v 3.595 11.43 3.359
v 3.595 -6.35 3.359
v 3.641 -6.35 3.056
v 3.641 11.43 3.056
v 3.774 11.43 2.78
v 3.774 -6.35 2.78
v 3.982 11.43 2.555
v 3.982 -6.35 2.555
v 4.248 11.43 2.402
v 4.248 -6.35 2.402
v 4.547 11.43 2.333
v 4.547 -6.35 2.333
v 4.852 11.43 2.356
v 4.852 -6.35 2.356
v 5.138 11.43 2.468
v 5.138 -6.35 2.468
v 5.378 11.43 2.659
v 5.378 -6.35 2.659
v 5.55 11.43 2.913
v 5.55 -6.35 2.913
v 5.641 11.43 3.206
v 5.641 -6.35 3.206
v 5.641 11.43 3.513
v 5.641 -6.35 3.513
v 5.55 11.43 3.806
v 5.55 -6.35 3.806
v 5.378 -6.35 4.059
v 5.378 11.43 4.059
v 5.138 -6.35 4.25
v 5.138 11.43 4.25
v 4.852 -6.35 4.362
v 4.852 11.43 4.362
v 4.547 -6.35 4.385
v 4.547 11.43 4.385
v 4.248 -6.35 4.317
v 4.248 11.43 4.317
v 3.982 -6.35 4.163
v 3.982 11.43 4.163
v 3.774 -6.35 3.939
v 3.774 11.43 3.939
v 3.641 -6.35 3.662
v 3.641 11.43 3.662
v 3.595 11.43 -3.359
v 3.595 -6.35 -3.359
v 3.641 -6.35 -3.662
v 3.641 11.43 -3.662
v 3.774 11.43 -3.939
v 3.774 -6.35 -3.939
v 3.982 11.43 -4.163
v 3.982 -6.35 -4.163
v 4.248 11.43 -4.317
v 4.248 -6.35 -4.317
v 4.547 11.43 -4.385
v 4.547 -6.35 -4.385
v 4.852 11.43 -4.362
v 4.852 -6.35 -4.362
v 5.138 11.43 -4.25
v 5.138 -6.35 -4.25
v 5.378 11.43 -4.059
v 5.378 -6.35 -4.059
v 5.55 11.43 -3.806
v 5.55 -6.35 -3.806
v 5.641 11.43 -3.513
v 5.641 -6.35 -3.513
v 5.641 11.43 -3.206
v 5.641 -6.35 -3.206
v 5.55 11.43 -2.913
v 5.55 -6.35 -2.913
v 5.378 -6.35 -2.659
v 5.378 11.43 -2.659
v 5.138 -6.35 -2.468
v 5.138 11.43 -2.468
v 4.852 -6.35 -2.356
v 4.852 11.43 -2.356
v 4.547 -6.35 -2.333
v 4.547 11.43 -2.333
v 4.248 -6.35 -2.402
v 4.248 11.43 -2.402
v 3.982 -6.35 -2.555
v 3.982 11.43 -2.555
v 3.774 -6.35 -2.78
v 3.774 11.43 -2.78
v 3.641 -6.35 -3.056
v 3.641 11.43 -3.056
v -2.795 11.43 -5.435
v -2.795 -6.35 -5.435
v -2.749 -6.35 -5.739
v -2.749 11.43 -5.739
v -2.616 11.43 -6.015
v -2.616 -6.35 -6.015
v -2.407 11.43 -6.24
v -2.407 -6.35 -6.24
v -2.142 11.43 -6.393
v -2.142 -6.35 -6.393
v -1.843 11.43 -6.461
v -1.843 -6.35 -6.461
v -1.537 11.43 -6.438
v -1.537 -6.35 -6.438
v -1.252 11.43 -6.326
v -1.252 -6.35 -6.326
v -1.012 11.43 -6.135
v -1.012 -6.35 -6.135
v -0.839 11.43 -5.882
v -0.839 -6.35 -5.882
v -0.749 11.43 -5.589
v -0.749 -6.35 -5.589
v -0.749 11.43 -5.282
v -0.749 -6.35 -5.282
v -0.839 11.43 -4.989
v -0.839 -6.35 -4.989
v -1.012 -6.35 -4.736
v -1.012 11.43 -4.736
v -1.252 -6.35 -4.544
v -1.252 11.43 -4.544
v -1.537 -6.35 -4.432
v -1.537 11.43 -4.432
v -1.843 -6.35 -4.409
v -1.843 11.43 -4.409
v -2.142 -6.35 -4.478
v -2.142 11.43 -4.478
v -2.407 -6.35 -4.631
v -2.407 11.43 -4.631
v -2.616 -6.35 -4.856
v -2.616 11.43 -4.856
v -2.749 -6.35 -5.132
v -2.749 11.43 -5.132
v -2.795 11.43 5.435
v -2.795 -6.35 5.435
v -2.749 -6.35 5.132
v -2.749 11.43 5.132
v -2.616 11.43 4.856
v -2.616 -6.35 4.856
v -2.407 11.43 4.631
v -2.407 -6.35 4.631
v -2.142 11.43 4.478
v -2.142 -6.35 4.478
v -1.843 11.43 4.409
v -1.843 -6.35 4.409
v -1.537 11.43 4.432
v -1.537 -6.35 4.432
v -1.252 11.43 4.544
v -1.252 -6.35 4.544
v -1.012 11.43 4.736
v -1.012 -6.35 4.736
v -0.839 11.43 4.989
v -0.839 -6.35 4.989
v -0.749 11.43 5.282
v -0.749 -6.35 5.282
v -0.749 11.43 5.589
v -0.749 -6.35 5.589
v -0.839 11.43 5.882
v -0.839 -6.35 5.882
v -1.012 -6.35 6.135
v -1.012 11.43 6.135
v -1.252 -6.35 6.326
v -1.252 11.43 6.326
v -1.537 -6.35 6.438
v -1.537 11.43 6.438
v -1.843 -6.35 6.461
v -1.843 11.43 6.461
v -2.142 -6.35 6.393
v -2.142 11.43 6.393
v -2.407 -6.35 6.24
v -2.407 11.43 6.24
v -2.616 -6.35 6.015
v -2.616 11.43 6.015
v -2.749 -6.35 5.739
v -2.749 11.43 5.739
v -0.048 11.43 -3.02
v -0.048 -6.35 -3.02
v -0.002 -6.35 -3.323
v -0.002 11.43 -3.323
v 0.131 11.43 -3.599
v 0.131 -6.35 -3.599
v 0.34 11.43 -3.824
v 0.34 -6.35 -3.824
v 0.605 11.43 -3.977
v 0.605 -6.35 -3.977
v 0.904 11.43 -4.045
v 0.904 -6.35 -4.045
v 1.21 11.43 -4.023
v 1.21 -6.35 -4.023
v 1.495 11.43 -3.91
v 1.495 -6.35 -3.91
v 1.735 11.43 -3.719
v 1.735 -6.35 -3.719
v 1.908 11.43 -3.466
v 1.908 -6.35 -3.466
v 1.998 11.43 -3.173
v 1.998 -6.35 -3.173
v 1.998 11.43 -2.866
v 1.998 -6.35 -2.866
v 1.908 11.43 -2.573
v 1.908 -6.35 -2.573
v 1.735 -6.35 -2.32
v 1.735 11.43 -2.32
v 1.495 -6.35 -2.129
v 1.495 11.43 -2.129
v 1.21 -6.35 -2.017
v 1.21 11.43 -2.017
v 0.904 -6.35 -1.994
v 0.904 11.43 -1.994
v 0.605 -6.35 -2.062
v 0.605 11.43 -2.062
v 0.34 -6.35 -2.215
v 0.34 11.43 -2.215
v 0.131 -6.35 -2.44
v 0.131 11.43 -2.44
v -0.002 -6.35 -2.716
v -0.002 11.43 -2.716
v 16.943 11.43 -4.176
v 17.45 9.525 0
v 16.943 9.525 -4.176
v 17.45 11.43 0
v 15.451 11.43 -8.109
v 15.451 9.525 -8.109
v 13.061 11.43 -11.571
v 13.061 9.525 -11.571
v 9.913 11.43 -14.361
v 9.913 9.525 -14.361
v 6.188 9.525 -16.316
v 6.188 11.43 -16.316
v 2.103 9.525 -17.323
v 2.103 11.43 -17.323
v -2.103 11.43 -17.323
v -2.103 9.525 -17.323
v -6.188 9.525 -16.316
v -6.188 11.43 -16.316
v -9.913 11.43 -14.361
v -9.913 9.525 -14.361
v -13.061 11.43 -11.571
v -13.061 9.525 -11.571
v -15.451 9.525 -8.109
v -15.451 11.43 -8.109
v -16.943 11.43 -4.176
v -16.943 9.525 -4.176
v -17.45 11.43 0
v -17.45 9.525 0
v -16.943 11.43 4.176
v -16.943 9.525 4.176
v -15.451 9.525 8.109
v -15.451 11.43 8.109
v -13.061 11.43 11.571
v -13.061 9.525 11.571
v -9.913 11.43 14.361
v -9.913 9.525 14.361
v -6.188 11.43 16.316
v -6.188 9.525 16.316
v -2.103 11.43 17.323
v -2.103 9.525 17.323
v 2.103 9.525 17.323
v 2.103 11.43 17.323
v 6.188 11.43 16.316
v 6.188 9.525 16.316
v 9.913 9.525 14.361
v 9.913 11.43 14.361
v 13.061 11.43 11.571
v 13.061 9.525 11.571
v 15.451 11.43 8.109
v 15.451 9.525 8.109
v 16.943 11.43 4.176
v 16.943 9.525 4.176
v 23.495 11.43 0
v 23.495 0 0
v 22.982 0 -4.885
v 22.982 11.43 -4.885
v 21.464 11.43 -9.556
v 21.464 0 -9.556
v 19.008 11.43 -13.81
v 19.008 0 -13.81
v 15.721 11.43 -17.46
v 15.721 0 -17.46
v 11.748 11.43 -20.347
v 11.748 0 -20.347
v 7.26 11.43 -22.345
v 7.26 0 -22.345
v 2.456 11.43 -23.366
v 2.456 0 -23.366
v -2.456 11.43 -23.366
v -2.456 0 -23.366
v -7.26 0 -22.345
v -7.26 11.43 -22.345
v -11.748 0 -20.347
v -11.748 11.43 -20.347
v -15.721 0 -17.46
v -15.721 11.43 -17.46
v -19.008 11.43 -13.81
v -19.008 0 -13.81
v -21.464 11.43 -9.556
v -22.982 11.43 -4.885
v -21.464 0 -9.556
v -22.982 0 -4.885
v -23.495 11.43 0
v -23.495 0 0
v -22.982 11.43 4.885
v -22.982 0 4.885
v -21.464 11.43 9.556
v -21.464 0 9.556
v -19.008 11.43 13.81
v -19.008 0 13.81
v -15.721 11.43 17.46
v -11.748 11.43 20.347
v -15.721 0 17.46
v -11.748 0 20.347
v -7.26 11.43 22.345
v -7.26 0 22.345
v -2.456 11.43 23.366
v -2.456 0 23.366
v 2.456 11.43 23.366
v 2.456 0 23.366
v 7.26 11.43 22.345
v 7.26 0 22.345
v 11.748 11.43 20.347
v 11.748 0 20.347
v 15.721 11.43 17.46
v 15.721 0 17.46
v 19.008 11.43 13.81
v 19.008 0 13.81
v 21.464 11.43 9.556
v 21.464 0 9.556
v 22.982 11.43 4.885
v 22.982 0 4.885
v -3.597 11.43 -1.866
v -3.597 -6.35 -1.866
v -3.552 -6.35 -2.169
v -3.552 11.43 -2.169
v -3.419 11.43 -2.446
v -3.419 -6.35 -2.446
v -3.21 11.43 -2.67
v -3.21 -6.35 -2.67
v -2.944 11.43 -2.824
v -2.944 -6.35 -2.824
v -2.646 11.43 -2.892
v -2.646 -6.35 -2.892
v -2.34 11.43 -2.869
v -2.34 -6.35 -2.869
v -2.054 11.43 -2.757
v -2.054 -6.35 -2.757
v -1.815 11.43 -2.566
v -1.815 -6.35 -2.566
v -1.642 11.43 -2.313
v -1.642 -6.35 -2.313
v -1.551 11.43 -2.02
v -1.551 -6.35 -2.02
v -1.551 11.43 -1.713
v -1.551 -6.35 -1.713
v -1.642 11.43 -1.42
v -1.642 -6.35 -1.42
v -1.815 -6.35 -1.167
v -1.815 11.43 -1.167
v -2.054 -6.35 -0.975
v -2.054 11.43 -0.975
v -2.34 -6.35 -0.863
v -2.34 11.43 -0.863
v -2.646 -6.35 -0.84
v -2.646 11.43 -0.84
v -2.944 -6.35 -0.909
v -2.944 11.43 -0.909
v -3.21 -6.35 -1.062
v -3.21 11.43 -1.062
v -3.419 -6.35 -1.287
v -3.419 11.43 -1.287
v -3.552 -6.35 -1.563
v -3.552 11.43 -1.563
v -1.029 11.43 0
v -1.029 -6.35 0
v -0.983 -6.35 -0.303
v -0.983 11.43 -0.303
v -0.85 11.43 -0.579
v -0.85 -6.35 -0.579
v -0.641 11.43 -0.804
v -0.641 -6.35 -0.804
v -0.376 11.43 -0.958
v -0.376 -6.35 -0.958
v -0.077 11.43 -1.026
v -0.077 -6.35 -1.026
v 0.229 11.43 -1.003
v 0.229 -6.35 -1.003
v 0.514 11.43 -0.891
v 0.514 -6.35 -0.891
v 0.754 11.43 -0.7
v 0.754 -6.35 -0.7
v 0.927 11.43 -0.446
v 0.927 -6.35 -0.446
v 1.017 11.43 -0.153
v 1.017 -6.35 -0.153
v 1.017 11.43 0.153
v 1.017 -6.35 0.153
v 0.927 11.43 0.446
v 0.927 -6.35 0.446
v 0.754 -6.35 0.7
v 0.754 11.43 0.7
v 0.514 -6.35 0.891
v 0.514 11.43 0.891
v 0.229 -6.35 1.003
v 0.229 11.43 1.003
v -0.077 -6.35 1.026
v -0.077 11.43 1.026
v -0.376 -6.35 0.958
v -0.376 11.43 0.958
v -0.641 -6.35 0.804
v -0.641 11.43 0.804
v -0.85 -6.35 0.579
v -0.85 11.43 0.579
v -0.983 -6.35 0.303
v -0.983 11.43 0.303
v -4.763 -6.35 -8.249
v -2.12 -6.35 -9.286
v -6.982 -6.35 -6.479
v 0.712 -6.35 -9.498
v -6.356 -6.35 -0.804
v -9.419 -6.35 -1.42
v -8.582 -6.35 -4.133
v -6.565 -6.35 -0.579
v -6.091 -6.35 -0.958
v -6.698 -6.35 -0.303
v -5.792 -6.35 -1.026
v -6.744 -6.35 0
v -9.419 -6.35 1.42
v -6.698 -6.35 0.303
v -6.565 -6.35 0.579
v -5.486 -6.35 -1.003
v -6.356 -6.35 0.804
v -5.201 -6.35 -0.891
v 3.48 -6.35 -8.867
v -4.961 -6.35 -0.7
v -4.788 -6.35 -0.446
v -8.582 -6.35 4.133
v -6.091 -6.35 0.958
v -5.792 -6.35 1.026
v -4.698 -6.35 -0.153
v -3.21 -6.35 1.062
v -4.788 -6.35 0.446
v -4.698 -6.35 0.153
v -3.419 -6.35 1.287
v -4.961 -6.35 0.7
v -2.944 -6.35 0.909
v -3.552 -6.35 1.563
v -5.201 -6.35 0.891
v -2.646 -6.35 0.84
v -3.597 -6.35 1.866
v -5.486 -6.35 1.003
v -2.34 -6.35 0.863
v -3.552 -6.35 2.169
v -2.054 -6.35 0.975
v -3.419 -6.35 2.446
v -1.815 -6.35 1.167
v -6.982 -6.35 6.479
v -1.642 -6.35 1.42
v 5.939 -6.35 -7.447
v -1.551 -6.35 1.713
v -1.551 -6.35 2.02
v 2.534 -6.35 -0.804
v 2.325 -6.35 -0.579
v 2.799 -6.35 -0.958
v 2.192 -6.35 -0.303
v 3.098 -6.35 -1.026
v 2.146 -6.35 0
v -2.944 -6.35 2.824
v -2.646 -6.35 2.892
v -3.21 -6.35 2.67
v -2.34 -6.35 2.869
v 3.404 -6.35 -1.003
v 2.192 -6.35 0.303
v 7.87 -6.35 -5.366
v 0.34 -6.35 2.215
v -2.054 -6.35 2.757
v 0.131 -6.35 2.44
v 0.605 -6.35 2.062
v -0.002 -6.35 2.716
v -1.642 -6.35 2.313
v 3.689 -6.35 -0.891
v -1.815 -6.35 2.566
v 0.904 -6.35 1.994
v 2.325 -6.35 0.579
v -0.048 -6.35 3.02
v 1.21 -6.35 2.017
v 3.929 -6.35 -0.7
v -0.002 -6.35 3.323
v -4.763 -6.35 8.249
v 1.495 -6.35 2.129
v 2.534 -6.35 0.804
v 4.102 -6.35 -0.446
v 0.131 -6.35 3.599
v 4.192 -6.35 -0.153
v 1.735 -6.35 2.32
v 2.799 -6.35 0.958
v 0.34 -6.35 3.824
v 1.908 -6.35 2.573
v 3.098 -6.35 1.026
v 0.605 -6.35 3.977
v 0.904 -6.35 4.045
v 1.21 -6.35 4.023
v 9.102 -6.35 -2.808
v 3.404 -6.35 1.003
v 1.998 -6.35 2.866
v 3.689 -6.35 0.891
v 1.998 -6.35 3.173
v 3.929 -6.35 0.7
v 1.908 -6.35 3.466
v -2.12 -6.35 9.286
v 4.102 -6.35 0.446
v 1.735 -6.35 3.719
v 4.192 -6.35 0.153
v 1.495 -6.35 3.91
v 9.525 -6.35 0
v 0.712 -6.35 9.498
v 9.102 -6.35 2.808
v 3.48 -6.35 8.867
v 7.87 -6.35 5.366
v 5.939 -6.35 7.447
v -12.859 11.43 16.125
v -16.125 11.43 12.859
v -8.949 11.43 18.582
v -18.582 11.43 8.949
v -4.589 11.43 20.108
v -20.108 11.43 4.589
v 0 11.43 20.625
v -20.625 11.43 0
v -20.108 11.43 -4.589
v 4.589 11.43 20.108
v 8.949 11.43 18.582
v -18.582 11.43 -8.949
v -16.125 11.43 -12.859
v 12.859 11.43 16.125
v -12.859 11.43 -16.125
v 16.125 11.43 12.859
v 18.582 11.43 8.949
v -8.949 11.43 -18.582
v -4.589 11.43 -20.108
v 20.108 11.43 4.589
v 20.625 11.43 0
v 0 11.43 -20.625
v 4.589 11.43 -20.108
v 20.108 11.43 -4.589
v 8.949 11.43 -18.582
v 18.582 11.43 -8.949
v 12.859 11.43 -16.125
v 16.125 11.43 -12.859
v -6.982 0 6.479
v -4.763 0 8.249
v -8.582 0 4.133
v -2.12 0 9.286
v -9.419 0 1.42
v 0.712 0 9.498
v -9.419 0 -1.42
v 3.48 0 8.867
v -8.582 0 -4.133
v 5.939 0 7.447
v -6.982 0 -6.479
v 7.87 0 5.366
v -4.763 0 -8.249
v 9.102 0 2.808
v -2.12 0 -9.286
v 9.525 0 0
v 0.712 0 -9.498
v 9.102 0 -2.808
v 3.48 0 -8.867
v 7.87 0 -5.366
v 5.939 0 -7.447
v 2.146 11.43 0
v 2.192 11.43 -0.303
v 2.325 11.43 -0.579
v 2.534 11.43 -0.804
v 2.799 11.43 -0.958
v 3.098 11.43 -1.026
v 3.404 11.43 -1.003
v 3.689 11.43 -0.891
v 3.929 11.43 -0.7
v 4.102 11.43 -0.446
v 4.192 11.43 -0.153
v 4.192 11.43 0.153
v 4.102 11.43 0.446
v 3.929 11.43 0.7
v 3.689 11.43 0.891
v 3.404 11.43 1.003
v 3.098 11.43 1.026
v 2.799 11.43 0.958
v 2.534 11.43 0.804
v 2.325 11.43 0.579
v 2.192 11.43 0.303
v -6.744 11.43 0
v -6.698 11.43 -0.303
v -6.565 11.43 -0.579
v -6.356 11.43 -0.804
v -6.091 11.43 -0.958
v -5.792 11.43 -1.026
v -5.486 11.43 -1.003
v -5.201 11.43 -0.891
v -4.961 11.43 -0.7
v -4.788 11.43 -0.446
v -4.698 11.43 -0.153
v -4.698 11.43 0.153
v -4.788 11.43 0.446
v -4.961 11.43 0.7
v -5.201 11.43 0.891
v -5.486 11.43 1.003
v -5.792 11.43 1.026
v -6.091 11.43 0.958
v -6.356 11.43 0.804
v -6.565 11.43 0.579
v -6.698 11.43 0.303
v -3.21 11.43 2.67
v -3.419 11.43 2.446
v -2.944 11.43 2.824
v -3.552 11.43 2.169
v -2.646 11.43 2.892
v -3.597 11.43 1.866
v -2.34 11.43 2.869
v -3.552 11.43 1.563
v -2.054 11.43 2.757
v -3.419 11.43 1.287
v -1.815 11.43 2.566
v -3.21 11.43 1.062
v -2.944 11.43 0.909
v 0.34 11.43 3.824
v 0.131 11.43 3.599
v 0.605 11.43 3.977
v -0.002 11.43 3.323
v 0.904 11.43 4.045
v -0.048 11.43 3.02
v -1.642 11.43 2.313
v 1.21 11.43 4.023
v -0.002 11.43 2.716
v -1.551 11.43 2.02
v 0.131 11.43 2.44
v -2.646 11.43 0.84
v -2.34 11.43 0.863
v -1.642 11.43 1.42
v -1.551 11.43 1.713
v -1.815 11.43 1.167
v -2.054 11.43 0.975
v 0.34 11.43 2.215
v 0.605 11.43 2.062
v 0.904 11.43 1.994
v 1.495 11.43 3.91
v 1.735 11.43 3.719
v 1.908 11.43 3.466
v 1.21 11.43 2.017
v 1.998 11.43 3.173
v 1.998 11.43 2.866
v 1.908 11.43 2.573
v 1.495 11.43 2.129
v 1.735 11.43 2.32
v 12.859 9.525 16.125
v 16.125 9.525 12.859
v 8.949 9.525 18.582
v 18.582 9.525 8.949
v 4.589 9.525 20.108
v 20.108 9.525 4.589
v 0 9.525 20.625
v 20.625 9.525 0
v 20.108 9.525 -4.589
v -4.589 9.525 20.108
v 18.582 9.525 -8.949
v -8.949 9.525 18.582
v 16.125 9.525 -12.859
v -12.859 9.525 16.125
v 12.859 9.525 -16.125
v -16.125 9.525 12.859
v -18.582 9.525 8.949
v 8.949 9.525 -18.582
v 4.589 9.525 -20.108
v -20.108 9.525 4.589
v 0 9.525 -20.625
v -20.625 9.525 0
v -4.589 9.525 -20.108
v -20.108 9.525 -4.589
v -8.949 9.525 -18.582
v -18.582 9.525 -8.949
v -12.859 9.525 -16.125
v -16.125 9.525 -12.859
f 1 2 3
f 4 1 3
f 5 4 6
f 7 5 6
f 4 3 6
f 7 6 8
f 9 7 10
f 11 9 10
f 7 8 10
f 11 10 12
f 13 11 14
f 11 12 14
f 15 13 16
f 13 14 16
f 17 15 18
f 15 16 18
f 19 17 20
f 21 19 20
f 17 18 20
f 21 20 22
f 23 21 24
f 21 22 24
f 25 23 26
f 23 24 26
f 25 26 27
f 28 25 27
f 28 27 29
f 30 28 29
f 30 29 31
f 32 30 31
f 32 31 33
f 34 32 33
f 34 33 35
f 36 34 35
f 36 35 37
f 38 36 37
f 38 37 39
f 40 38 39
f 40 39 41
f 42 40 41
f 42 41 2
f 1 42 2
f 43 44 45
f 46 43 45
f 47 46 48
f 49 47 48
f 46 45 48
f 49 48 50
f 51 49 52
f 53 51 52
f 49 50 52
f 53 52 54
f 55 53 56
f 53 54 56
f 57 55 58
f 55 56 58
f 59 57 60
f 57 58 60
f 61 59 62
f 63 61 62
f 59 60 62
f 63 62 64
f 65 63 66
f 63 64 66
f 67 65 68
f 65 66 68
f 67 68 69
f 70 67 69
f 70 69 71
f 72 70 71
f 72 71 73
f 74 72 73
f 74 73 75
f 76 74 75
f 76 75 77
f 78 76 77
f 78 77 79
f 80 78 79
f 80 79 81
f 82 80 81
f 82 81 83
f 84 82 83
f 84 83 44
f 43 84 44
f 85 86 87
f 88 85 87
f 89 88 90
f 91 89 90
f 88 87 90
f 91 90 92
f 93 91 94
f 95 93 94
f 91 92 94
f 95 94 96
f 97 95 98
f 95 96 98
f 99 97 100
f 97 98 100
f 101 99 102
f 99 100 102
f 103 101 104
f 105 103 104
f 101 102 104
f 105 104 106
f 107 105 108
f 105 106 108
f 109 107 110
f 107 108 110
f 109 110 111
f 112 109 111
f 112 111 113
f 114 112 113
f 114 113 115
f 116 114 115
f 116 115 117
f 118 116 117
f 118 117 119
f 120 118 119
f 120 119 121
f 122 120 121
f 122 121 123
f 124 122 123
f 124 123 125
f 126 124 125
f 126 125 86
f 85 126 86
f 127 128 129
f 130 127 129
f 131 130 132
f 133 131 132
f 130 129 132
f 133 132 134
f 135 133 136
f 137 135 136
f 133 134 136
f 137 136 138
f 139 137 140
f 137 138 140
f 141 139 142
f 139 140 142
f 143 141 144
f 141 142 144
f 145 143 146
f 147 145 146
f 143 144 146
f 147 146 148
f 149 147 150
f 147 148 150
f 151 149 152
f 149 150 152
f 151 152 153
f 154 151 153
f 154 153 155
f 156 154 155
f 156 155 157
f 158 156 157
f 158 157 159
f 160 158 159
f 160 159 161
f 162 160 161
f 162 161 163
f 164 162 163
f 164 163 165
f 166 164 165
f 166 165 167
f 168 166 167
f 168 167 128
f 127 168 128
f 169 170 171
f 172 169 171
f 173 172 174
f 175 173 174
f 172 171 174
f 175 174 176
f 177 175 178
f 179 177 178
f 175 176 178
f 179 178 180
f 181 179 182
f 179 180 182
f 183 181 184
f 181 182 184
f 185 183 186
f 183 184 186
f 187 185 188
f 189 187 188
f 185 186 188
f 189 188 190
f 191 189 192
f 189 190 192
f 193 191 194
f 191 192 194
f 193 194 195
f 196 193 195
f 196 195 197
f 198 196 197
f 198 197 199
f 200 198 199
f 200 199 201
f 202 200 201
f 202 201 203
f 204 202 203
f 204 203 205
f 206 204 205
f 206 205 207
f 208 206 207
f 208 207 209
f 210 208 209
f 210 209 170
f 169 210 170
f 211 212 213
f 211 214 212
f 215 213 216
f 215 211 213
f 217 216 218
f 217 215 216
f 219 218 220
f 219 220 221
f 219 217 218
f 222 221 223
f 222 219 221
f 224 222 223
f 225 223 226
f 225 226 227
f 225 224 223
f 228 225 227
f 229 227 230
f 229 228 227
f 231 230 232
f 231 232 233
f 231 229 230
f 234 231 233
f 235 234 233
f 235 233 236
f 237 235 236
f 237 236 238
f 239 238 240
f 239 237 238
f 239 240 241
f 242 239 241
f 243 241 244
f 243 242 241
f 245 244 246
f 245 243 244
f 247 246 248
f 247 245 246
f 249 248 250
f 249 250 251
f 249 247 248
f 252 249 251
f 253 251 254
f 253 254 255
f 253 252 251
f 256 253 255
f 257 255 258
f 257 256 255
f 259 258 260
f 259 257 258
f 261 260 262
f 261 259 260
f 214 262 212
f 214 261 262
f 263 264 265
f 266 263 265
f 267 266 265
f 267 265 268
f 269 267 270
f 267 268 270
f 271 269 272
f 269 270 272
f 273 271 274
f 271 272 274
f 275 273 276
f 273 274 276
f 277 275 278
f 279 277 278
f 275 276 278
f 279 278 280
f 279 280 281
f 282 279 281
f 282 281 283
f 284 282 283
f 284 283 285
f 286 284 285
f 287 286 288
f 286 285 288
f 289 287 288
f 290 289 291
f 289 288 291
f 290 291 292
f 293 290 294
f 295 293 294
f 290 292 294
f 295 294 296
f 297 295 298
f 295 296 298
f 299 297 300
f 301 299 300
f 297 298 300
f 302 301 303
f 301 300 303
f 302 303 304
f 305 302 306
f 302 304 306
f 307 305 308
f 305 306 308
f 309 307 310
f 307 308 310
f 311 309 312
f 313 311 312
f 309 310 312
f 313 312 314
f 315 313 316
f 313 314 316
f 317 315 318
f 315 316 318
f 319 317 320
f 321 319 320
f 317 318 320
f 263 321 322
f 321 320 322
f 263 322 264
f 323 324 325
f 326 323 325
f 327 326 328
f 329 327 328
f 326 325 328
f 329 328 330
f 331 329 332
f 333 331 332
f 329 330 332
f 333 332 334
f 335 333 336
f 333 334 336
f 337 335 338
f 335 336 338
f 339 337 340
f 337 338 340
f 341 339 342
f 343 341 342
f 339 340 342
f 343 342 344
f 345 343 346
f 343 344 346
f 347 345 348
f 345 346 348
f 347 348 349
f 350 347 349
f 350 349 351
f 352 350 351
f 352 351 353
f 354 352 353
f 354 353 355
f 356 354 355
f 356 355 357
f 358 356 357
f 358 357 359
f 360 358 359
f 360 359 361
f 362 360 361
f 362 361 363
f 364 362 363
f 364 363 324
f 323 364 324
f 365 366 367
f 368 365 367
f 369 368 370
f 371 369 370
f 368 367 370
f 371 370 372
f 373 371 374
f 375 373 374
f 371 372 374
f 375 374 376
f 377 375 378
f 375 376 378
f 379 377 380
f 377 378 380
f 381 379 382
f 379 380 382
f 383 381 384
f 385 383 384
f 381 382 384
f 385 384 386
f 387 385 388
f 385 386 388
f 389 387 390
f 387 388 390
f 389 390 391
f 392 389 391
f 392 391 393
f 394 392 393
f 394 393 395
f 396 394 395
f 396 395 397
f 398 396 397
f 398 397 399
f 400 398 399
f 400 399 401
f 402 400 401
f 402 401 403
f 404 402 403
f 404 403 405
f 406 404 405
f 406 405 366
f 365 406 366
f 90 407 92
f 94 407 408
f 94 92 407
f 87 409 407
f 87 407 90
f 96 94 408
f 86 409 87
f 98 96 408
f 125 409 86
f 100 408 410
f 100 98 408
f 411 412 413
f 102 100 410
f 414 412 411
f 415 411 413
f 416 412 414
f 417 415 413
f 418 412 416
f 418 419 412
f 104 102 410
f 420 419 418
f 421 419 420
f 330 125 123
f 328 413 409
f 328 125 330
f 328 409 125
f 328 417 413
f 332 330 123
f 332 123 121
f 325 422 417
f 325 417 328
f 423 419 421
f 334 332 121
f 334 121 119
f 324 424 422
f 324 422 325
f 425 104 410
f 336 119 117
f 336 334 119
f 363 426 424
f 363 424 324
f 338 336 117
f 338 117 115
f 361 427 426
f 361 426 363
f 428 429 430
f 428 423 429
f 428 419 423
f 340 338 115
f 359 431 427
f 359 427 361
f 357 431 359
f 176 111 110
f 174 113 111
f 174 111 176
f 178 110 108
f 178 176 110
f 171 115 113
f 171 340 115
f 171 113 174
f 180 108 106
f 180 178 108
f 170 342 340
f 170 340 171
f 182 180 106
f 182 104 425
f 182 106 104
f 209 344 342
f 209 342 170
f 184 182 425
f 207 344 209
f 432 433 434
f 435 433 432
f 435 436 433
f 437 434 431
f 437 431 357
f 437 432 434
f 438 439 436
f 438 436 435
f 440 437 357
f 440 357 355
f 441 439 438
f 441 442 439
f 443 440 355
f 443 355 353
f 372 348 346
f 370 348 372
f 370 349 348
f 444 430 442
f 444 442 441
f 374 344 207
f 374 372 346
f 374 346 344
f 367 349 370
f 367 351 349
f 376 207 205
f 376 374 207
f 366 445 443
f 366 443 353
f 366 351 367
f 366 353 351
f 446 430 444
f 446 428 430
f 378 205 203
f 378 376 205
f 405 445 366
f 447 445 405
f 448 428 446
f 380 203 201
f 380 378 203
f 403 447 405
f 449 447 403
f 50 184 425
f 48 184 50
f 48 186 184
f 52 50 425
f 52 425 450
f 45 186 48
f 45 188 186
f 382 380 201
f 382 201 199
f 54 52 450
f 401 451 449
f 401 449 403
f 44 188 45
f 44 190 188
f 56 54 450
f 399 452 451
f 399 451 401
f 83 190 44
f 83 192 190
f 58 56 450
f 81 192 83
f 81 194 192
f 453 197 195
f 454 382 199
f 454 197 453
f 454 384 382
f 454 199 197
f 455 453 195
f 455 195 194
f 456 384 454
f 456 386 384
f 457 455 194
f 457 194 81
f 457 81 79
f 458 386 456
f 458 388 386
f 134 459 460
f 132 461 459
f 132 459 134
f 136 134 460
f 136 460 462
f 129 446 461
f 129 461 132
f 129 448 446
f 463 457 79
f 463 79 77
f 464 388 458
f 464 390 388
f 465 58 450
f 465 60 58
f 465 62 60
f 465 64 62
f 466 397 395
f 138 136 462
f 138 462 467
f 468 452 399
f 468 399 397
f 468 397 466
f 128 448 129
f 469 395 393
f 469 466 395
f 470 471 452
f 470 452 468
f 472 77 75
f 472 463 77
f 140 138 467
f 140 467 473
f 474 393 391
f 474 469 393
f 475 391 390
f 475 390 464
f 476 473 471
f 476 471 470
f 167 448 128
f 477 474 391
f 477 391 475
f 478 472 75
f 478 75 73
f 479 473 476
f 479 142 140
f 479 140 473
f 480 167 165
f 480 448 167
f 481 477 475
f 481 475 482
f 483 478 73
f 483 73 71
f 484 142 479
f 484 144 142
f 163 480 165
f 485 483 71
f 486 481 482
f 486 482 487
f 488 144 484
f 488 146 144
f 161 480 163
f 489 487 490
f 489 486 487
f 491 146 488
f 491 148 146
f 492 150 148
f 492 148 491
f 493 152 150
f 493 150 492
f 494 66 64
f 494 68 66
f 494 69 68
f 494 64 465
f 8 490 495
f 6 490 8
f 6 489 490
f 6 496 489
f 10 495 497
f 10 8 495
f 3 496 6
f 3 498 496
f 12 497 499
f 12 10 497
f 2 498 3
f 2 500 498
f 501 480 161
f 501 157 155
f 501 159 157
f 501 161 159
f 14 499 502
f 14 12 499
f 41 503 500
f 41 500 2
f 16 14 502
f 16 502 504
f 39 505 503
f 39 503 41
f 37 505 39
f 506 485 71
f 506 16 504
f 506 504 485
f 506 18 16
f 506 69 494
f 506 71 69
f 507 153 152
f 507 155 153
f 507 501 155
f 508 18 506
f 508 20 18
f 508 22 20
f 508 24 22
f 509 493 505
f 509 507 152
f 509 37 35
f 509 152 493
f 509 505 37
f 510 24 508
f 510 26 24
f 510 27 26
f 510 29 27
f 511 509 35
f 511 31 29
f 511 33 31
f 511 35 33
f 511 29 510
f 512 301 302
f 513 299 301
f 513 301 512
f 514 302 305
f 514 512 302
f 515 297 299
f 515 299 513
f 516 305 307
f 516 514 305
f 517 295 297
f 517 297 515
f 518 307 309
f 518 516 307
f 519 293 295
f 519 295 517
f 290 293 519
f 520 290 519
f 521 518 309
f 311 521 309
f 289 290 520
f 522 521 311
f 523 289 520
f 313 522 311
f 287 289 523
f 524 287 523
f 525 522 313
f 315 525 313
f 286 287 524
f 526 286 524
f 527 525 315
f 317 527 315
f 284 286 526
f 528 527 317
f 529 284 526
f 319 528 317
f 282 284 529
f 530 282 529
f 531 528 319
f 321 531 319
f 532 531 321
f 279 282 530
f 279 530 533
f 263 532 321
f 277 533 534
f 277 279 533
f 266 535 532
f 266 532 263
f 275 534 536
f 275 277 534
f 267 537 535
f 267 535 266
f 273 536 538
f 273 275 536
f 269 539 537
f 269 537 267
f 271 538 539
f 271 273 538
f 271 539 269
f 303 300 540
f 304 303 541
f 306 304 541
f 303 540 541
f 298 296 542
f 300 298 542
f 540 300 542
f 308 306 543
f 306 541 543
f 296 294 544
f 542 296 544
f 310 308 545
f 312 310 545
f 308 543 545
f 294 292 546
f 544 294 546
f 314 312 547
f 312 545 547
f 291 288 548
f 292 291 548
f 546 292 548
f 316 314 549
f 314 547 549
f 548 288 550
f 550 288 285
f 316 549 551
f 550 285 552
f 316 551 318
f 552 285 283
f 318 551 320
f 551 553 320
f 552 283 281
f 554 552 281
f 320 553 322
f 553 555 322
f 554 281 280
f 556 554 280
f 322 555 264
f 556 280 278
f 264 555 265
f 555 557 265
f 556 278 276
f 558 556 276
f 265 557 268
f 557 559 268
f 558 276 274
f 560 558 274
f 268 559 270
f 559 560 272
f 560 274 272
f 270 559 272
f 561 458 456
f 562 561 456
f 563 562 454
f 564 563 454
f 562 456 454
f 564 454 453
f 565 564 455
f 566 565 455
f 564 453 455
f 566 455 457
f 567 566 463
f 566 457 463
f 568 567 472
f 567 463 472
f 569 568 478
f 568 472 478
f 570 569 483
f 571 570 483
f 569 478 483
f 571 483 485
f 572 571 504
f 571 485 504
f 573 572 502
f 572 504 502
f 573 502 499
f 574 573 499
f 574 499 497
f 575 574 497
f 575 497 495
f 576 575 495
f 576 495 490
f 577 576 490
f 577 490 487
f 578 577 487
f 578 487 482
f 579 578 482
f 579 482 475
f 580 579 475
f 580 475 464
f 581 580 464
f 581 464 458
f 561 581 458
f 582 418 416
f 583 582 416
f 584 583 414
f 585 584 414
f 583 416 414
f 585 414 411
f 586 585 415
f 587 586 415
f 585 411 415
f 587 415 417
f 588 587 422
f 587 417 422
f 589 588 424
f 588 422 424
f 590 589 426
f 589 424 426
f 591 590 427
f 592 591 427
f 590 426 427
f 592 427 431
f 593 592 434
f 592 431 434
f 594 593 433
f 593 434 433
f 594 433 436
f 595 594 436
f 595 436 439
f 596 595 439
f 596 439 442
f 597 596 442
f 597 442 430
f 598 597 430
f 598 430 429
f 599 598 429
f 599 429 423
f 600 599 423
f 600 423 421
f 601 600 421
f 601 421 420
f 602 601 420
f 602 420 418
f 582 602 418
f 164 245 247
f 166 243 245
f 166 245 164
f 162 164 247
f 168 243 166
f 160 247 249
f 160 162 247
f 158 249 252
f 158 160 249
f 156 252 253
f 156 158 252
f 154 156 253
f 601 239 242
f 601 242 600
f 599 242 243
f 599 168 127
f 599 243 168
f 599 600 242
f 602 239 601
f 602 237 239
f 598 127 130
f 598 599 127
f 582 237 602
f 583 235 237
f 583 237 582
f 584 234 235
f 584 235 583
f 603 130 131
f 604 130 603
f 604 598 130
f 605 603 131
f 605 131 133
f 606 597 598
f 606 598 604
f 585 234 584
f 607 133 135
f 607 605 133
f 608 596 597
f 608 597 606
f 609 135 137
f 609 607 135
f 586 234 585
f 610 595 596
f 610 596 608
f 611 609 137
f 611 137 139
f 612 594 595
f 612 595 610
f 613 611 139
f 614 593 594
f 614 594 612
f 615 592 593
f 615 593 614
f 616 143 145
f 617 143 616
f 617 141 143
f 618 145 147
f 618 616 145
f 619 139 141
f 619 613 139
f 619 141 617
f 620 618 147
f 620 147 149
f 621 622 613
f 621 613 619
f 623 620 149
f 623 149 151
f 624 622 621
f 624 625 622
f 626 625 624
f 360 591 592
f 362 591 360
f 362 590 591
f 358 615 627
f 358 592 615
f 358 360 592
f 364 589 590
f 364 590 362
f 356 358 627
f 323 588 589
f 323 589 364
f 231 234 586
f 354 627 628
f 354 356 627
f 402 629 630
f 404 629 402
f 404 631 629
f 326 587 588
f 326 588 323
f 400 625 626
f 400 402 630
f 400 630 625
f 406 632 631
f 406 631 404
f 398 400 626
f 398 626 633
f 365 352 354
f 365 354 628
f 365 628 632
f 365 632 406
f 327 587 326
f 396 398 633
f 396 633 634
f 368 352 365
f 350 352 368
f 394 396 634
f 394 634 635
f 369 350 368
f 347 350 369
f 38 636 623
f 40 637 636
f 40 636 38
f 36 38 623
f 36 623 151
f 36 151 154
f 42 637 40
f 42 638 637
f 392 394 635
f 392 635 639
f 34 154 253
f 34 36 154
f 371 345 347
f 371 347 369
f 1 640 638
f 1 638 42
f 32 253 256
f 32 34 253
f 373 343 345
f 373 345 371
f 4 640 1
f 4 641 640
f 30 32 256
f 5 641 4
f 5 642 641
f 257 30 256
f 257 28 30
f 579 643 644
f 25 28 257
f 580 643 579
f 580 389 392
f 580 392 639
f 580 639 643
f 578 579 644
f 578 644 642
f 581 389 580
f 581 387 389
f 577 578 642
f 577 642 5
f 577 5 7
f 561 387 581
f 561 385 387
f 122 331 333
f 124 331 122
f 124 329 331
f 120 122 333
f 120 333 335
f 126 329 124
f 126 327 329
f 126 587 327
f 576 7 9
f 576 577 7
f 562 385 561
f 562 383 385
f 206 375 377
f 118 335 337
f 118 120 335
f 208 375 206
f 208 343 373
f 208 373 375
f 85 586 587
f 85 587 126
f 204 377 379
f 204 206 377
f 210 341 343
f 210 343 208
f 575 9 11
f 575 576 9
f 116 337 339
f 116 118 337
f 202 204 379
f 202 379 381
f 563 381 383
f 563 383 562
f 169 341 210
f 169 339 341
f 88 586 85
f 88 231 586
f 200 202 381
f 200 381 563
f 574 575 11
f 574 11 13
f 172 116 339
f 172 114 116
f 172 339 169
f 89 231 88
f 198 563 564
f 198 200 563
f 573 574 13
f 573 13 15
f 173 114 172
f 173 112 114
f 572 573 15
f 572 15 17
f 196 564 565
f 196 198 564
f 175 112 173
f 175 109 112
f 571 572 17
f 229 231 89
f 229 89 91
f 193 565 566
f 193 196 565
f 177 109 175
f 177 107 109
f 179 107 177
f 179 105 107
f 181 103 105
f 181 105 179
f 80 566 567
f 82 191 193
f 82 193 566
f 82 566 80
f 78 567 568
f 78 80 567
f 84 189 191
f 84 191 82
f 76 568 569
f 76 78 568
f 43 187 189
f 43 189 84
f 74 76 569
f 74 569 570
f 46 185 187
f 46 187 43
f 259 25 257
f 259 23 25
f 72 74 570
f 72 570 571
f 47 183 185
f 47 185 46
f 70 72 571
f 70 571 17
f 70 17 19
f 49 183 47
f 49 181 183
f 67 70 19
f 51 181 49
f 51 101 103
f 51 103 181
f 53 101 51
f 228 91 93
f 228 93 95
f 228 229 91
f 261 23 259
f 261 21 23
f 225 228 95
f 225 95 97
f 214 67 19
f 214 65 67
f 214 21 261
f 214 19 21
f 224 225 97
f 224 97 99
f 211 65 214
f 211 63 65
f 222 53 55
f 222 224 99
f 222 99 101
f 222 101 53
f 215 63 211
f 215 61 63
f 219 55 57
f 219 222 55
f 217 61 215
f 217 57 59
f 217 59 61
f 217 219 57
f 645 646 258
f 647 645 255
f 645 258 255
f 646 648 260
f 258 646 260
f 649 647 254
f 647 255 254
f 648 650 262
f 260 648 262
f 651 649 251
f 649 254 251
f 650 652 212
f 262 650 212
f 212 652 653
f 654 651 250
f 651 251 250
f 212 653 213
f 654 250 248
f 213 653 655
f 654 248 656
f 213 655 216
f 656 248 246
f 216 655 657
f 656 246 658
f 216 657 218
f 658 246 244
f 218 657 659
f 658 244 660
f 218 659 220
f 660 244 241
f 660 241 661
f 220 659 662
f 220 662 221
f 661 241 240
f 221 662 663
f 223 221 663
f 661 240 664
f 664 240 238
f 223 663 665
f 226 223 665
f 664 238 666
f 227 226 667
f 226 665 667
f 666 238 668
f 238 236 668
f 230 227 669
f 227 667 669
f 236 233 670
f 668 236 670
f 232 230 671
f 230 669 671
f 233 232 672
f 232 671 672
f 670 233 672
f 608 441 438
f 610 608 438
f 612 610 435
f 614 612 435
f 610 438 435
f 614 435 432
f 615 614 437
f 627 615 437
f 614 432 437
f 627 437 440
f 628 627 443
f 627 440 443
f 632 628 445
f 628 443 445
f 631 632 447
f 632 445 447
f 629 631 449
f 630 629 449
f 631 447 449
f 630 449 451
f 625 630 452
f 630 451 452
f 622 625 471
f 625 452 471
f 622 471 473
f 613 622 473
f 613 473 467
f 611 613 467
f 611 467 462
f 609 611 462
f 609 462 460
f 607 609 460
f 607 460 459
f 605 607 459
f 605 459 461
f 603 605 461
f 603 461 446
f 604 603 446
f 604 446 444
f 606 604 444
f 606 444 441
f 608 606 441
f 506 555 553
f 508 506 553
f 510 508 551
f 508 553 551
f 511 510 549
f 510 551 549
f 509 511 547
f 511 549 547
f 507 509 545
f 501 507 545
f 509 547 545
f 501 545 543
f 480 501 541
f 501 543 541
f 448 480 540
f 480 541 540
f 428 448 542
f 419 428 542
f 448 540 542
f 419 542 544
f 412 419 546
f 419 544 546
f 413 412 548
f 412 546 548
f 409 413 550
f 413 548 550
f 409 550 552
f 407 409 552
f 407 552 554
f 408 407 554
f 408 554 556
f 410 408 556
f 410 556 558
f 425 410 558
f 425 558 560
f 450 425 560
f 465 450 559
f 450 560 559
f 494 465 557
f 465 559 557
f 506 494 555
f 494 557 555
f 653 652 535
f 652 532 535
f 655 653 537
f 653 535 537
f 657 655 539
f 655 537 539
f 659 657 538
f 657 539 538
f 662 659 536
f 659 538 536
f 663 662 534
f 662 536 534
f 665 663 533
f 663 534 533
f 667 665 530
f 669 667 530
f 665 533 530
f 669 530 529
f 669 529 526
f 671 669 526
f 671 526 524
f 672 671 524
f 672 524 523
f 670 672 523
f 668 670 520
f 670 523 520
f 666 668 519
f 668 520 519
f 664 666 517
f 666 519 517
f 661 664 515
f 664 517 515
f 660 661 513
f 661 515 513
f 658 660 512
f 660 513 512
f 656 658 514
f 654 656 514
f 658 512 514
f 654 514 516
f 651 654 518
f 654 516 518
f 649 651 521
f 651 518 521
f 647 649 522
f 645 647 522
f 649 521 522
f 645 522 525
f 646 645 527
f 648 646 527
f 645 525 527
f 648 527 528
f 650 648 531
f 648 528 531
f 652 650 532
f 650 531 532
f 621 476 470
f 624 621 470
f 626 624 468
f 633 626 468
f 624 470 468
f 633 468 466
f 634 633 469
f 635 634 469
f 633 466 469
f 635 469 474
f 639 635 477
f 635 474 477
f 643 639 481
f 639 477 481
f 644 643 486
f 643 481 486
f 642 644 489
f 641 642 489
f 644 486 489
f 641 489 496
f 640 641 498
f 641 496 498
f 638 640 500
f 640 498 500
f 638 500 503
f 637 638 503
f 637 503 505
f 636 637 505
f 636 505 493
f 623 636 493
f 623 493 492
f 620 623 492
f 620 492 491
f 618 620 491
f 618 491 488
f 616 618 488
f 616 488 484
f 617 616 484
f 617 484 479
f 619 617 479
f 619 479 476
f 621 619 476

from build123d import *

# Parameters (mm, degrees)
SKETCH2_R                       = 23.495
BOSS_EXTRUDE1_DEPTH             = 11.43
SKETCH8_W                       = 3.175
SKETCH8_H                       = 1.905
SKETCH12_R                      = 9.525
BOSS_EXTRUDE2_DEPTH             = 6.35
F_46_0_081_DIAMETER_HOLE1_D     = 2.0574
F_46_0_081_DIAMETER_HOLE1_DEPTH = 17.78


with BuildPart() as part:
    # Sketch2 → Boss-Extrude1 (new body)
    with BuildSketch(Plane(origin=(0, 0, 0), x_dir=(1, 0, 0), z_dir=(0, 1, 0))):
        Circle(SKETCH2_R)
    extrude(amount=BOSS_EXTRUDE1_DEPTH)

    # Sketch8 → Cut-Revolve1 (revolve, cut)
    with BuildSketch(Plane.XY):
        with Locations((19.0373, 10.4775)):
            Rectangle(SKETCH8_W, SKETCH8_H)
    revolve(axis=Axis((0, -0.47625, 0), (0, 1, 0)), mode=Mode.SUBTRACT)

    # Sketch12 → Boss-Extrude2 (add)
    with BuildSketch(Plane.XZ):
        Circle(SKETCH12_R)
    extrude(amount=BOSS_EXTRUDE2_DEPTH)

    # #46 (0.081) Diameter Hole1
    with Locations(Plane(origin=(0, 11.43, 0), x_dir=(1, 0, 0), z_dir=(0, 1, 0))):
        with Locations((-5.715, 0), (-2.568628957, 1.866218176), (0, 0), (-1.766032123, 5.435287991), (4.623532123, 3.359192717), (4.623532123, -3.359192717), (-1.766032123, -5.435287991), (0.981128957, 3.019604439), (3.175, 0), (0.981128957, -3.019604439), (-2.568628957, -1.866218176)):
            Hole(F_46_0_081_DIAMETER_HOLE1_D / 2, depth=F_46_0_081_DIAMETER_HOLE1_DEPTH)


solid = part.part
